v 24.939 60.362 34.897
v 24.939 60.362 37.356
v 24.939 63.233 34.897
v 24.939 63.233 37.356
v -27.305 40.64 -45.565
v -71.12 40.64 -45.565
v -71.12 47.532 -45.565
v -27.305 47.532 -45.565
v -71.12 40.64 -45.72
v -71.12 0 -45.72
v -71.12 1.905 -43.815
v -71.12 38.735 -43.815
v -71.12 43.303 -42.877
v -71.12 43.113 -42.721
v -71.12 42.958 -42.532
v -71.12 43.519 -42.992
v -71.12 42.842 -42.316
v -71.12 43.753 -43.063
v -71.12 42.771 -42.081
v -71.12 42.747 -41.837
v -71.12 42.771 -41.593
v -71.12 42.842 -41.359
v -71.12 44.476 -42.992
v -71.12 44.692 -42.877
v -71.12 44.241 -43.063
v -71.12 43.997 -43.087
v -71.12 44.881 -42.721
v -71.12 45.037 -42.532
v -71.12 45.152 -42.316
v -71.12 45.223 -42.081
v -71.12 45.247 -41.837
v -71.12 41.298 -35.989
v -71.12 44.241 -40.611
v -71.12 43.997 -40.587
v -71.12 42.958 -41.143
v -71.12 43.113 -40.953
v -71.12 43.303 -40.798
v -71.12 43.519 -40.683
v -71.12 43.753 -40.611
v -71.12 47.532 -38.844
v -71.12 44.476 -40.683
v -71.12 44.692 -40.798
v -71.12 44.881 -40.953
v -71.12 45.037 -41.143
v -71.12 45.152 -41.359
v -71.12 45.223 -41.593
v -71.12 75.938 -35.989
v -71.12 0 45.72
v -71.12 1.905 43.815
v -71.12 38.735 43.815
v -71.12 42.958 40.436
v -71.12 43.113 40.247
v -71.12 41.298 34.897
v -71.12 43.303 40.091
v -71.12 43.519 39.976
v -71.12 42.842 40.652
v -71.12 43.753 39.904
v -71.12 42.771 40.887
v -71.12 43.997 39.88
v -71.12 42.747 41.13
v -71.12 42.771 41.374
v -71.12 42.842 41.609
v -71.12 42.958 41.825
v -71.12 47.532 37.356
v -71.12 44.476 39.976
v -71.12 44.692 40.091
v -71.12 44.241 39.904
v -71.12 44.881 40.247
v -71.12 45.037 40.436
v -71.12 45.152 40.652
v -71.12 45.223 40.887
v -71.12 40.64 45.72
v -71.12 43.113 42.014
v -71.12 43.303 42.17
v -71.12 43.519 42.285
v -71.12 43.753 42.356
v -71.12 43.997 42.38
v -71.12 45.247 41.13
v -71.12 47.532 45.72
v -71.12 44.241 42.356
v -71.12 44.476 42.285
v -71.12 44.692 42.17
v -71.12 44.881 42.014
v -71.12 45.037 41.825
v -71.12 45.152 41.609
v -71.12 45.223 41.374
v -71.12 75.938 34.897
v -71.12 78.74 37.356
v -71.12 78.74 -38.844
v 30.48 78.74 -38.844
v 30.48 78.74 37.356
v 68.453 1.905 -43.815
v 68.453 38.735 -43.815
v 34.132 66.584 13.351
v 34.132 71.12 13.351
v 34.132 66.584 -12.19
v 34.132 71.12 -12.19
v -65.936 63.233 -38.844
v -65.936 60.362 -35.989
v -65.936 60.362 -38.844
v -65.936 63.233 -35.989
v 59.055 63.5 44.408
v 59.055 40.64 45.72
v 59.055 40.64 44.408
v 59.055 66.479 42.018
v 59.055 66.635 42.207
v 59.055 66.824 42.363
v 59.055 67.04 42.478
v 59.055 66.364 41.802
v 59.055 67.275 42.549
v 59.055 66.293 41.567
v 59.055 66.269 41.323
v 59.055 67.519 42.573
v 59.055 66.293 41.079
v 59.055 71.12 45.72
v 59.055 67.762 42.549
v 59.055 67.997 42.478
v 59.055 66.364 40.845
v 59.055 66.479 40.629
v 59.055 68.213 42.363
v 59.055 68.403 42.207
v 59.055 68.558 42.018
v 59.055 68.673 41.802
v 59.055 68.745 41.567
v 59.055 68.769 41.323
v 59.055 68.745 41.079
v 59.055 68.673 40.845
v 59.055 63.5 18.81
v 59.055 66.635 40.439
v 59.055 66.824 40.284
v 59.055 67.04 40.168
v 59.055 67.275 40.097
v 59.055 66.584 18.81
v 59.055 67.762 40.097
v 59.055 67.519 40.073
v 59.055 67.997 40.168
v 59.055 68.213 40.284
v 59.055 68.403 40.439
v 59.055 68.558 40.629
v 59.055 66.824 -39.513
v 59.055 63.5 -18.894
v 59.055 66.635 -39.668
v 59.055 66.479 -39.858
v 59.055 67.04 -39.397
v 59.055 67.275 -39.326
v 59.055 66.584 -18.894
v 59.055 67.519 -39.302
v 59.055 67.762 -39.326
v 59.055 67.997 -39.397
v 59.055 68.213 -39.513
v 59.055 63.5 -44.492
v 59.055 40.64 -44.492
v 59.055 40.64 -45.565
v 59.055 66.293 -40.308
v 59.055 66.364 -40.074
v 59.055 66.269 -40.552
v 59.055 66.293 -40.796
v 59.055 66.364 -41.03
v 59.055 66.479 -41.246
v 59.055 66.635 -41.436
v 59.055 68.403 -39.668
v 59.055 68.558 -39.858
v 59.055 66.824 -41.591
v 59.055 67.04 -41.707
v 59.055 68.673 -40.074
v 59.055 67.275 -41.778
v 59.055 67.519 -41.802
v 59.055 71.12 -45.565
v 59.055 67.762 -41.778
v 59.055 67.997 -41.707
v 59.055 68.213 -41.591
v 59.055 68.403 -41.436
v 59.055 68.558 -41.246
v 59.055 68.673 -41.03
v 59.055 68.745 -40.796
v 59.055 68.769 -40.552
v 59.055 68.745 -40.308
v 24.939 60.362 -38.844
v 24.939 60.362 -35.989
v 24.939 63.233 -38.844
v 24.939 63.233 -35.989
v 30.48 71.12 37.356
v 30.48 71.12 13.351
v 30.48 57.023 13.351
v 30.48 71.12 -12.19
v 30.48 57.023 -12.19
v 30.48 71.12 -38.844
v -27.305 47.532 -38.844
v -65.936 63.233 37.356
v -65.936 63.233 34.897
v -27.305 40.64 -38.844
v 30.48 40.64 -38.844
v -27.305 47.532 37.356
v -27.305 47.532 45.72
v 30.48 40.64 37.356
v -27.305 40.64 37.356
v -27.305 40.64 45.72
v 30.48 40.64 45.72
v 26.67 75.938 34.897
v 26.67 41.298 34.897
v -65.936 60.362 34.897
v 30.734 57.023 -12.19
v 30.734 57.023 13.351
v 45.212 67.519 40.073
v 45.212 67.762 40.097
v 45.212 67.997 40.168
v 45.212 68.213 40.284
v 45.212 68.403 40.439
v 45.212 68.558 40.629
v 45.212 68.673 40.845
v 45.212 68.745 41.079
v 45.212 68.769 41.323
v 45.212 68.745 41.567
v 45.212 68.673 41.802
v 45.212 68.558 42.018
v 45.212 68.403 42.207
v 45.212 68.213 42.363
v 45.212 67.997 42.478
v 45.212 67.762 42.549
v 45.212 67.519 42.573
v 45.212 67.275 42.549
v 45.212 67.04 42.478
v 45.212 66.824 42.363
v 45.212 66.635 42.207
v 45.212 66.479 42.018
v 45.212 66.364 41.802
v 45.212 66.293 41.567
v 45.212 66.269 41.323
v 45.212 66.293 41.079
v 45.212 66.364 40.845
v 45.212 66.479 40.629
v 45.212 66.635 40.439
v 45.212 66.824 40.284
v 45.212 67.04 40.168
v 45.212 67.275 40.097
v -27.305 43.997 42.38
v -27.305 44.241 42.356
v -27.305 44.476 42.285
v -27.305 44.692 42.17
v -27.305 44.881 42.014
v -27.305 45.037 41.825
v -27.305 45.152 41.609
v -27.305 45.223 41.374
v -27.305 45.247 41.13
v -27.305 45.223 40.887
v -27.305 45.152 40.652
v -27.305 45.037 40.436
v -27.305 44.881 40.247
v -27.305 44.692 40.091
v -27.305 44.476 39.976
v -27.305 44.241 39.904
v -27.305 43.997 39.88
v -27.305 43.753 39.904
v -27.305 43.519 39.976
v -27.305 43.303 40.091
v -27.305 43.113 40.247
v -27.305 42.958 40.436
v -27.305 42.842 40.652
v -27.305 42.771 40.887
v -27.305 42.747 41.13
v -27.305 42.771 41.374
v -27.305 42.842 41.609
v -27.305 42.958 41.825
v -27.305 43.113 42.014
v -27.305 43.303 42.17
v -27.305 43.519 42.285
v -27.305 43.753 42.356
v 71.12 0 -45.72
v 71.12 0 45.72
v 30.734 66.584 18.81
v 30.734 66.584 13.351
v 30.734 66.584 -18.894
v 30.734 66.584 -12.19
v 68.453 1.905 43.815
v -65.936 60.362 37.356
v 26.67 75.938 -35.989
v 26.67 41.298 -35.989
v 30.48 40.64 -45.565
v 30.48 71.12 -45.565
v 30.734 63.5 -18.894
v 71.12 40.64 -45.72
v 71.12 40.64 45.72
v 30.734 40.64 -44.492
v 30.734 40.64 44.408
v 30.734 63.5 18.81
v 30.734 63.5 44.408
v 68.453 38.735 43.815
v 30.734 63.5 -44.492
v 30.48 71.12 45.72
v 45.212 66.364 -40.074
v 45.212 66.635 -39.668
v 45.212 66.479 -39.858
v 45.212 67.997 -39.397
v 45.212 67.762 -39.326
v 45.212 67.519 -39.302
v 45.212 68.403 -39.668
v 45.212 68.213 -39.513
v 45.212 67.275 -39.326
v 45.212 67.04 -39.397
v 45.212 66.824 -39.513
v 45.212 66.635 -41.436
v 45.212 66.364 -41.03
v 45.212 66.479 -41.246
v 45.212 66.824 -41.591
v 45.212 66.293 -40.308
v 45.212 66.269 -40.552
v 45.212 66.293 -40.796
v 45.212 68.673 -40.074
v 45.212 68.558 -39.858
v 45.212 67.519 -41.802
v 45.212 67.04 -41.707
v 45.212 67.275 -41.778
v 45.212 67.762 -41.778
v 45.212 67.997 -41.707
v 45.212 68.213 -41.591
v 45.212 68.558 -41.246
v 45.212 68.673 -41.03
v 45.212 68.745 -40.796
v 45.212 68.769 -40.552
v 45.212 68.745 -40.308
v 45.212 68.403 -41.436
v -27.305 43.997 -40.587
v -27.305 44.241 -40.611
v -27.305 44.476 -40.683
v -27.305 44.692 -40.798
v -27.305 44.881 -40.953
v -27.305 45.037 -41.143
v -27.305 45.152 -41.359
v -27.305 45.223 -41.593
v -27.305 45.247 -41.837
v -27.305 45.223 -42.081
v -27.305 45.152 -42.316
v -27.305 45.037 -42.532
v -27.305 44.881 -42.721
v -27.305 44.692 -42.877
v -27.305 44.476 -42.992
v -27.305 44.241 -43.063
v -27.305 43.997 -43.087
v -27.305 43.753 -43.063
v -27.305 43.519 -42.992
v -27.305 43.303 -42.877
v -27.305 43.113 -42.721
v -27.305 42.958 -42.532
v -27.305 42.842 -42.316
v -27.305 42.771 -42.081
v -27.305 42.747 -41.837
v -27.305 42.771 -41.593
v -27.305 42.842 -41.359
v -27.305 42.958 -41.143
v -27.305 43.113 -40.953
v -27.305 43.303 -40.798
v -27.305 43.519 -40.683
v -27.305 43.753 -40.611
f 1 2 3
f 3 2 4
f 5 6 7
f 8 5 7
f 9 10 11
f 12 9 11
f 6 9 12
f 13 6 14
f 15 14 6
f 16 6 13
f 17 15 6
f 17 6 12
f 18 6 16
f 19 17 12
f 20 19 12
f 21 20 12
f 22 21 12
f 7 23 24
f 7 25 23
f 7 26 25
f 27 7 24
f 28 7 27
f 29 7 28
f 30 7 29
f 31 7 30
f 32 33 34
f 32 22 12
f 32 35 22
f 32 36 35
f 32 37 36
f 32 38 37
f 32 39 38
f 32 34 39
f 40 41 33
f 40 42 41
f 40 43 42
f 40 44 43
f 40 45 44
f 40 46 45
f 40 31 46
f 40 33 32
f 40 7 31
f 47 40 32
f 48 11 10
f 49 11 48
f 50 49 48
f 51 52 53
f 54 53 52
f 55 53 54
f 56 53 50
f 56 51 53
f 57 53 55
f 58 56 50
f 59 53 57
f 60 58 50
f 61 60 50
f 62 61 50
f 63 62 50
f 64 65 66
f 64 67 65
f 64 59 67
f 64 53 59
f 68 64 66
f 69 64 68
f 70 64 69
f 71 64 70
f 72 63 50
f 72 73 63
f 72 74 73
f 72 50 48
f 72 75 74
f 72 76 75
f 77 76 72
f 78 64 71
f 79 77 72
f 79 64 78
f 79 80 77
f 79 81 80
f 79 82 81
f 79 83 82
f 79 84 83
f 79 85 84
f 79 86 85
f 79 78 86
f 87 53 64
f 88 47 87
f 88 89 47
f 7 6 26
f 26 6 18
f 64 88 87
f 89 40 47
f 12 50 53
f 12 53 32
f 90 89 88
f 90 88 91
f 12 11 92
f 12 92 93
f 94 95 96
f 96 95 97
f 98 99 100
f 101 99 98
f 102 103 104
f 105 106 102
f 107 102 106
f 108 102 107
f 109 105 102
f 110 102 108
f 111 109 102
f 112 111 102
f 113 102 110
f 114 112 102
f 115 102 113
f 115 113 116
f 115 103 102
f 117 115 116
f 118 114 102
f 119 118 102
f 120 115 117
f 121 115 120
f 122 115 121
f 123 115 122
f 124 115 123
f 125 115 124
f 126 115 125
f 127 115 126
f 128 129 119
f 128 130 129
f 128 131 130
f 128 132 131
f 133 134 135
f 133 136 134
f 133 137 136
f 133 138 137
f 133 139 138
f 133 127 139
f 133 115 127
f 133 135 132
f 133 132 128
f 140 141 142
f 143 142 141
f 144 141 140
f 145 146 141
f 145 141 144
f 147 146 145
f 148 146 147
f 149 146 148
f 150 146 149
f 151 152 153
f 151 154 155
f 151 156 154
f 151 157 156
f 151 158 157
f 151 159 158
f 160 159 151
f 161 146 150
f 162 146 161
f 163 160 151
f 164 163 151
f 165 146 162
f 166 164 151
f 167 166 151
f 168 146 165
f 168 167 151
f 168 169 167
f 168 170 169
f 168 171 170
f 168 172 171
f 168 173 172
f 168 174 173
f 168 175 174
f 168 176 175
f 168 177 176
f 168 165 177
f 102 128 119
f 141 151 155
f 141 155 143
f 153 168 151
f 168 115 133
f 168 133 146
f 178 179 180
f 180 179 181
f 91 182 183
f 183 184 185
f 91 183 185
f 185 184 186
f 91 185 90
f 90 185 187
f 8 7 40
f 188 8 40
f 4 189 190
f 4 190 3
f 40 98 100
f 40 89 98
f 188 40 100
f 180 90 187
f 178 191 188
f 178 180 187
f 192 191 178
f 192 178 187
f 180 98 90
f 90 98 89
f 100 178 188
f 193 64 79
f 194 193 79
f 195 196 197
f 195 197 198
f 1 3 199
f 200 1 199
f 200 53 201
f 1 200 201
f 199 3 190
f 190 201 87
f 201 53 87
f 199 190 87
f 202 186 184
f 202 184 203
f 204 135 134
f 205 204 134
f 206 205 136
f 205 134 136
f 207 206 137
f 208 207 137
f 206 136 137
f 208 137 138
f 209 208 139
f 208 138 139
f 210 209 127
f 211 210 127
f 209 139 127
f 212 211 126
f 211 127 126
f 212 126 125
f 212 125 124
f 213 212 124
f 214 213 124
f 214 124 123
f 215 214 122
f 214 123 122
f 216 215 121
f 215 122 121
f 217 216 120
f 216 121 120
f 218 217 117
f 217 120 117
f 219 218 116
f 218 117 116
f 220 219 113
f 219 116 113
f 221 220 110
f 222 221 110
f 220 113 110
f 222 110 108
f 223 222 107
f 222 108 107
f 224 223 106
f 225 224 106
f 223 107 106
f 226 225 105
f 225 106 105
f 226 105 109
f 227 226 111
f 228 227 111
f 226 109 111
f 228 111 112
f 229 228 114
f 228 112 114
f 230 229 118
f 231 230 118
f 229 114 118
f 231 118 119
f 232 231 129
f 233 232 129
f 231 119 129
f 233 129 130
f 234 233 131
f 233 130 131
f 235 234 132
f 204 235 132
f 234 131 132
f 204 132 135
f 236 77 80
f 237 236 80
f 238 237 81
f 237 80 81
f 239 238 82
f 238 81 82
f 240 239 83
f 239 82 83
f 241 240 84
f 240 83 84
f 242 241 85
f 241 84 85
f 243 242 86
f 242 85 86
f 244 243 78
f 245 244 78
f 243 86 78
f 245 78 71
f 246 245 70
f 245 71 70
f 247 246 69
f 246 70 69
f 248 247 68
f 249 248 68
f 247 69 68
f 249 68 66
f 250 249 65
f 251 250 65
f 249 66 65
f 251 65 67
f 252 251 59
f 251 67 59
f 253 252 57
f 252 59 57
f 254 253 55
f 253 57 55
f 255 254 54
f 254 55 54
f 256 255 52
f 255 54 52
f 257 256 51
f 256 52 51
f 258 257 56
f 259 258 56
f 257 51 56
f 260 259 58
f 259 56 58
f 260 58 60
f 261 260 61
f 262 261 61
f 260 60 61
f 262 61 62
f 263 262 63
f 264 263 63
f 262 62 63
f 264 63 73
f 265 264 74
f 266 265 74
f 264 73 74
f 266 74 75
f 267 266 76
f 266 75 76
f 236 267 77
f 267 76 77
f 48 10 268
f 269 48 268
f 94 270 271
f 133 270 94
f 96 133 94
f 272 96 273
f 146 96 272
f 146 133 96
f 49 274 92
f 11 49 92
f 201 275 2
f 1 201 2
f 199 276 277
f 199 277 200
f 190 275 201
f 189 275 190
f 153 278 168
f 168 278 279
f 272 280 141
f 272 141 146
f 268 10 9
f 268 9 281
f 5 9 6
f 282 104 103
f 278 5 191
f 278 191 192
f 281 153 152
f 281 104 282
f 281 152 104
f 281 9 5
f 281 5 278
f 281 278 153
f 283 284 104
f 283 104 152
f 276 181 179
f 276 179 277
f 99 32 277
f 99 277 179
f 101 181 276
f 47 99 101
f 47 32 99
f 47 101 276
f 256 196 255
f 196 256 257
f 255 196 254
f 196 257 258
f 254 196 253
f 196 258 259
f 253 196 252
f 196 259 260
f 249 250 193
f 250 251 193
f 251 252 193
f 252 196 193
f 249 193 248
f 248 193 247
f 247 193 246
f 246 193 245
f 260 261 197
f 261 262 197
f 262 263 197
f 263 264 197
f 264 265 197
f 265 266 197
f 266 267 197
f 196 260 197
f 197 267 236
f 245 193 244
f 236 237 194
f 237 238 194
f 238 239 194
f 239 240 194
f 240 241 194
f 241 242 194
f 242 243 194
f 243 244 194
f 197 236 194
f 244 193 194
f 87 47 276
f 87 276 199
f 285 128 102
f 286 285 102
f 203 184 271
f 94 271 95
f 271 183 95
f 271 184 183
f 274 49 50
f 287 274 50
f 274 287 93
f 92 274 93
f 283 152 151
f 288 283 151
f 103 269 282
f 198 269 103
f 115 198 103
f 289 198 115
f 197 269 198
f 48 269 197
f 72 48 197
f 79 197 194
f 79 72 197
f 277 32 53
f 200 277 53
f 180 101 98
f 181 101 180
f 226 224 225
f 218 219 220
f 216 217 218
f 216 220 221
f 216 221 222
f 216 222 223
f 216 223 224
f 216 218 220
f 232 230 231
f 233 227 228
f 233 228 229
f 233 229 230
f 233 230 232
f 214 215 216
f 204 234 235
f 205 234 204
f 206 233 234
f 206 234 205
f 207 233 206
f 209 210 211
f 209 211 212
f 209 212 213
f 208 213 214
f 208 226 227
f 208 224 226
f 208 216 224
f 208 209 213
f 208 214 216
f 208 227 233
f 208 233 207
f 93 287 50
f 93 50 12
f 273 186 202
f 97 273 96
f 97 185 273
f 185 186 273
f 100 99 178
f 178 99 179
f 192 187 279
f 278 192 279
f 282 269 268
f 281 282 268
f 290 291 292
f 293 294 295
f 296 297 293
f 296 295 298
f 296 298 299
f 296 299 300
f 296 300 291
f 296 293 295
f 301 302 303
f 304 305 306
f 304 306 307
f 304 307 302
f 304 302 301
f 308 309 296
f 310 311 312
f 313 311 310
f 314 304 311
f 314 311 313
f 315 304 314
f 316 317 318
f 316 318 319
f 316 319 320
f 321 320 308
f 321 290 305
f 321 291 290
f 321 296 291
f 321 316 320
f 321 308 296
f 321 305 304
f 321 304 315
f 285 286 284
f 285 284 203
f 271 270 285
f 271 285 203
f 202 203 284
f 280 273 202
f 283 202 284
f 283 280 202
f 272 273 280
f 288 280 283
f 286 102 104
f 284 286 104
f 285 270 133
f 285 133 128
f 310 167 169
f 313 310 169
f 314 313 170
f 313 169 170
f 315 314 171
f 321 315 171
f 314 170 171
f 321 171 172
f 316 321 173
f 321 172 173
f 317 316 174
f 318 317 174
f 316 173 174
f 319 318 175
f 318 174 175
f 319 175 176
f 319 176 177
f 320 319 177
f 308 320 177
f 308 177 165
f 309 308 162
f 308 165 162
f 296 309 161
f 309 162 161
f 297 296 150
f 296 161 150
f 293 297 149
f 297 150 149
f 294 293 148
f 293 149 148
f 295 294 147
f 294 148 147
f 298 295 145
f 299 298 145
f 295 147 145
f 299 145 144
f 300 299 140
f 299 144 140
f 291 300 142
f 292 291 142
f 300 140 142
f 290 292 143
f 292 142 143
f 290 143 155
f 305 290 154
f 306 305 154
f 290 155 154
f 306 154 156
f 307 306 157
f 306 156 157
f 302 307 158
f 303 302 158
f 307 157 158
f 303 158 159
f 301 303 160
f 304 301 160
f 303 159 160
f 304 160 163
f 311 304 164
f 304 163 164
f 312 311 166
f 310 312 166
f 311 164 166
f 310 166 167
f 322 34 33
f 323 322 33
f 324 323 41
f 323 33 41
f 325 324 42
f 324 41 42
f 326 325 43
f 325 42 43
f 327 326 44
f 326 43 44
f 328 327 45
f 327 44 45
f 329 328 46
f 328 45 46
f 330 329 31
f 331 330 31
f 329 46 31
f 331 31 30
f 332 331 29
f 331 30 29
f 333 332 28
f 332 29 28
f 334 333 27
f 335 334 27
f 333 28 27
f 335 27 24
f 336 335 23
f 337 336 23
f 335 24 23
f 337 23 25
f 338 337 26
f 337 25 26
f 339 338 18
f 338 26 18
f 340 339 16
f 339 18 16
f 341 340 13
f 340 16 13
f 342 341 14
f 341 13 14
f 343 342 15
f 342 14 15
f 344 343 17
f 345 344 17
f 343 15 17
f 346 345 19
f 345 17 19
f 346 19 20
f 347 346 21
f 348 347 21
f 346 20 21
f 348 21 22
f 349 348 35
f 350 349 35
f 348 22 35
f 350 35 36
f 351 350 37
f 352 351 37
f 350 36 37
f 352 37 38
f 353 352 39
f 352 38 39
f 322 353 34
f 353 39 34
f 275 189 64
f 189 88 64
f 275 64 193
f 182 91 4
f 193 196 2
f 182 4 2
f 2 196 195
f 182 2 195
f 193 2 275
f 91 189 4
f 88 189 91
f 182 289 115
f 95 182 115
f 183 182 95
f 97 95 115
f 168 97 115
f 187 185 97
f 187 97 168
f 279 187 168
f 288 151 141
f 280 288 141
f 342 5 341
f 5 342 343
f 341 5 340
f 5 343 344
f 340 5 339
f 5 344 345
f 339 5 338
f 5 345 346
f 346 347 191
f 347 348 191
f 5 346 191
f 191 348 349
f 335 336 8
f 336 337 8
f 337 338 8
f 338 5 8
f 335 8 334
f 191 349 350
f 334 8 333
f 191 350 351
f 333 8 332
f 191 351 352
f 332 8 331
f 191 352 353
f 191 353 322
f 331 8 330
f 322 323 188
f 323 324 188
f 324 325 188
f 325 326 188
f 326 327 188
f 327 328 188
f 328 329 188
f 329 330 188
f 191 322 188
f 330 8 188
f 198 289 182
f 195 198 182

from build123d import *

# Parameters (mm, degrees)
SKETCH1_W           = 142.24
SKETCH1_H           = 91.44
BOSS_EXTRUDE1_DEPTH = 40.64
SKETCH3_W           = 101.6
SKETCH3_H           = 76.2
BOSS_EXTRUDE2_DEPTH = 38.1
SKETCH4_W           = 70.885711102
SKETCH4_H           = 34.639527003
CUT_EXTRUDE2_DEPTH  = 97.79
SKETCH5_W           = 90.875163882
SKETCH5_H           = 2.870686322
CUT_EXTRUDE3_DEPTH  = 97.79
SKETCH8_W           = 91.28479526
SKETCH8_H           = 30.48
BOSS_EXTRUDE4_DEPTH = 28.575
SKETCH9_W           = 37.704579212
SKETCH9_H           = 3.084273822
CUT_EXTRUDE4_DEPTH  = 28.321
SKETCH10_W          = 3.65161605
SKETCH10_H          = 25.540665071
CUT_EXTRUDE5_DEPTH  = 14.097
SKETCH2_W           = 87.63
SKETCH2_H           = 36.83
CUT_EXTRUDE6_DEPTH  = 225.933
SKETCH12_W          = 91.44
SKETCH12_H          = 40.64
BOSS_EXTRUDE5_DEPTH = 2.667
SKETCH13_W          = 6.720820965
SKETCH13_H          = 6.891818051
SKETCH13_R          = 1.25
SKETCH13_W_2        = 8.363974295
BOSS_EXTRUDE6_DEPTH = 43.815
SKETCH14_R          = 1.25
CUT_EXTRUDE7_DEPTH  = 13.843


with BuildPart() as part:
    # Sketch1 → Boss-Extrude1 (new body)
    with BuildSketch(Plane(origin=(0, 0, 0), x_dir=(1, 0, 0), z_dir=(0, 1, 0))):
        Rectangle(SKETCH1_W, SKETCH1_H)
    extrude(amount=BOSS_EXTRUDE1_DEPTH)

    # Sketch3 → Boss-Extrude2 (add)
    with BuildSketch(Plane(origin=(0, 40.64, 0), x_dir=(1, 0, 0), z_dir=(0, 1, 0))):
        with Locations((-20.32, 0.743974295)):
            Rectangle(SKETCH3_W, SKETCH3_H)
    extrude(amount=BOSS_EXTRUDE2_DEPTH)

    # Sketch4 → Cut-Extrude2 (cut)
    with BuildSketch(Plane.ZY.offset(71.12)):
        with Locations((-0.546263413, 58.617752018)):
            Rectangle(SKETCH4_W, SKETCH4_H)
    extrude(amount=-CUT_EXTRUDE2_DEPTH, mode=Mode.SUBTRACT)

    # Sketch5 → Cut-Extrude3 (cut)
    with BuildSketch(Plane.XY.offset(37.356025705)):
        with Locations((-20.498494518, 61.797236891)):
            Rectangle(SKETCH5_W, SKETCH5_H)
    extrude(amount=-CUT_EXTRUDE3_DEPTH, mode=Mode.SUBTRACT)

    # Sketch8 → Boss-Extrude4 (add)
    with BuildSketch(Plane(origin=(30.48, 0, 0), x_dir=(0, 0, -1), z_dir=(1, 0, 0))):
        with Locations((-0.07760237, 55.88)):
            Rectangle(SKETCH8_W, SKETCH8_H)
    extrude(amount=BOSS_EXTRUDE4_DEPTH)

    # Sketch9 → Cut-Extrude4 (cut)
    with BuildSketch(Plane(origin=(59.055, 0, 0), x_dir=(0, 0, -1), z_dir=(1, 0, 0))):
        with Locations((0.04199785, 65.042136911)):
            Rectangle(SKETCH9_W, SKETCH9_H)
        with Locations((0.04199785, 61.957863089)):
            Rectangle(SKETCH9_W, SKETCH9_H)
        Polygon((-18.810291756, 63.5), (-44.40800215, 63.5), (-44.40800215, 40.64), (44.49199785, 40.64), (44.49199785, 63.5), (18.894287456, 63.5), (18.894287456, 60.415726178), (-18.810291756, 60.415726178), align=None)
    extrude(amount=-CUT_EXTRUDE4_DEPTH, mode=Mode.SUBTRACT)

    # Sketch10 → Cut-Extrude5 (cut)
    with BuildSketch(Plane(origin=(0, 71.12, 0), x_dir=(1, 0, 0), z_dir=(0, 1, 0))):
        with Locations((32.305808025, -0.58046966)):
            Rectangle(SKETCH10_W, SKETCH10_H)
    extrude(amount=-CUT_EXTRUDE5_DEPTH, mode=Mode.SUBTRACT)

    # Sketch2 → Cut-Extrude6 (cut)
    with BuildSketch(Plane(origin=(71.12, 0, 0), x_dir=(0, 0, -1), z_dir=(1, 0, 0))):
        with Locations((0, 20.32)):
            Rectangle(SKETCH2_W, SKETCH2_H)
    extrude(amount=-CUT_EXTRUDE6_DEPTH, mode=Mode.SUBTRACT)

    # Sketch12 → Boss-Extrude5 (add)
    with BuildSketch(Plane(origin=(71.12, 0, 0), x_dir=(0, 0, -1), z_dir=(1, 0, 0))):
        with Locations((0, 20.32)):
            Rectangle(SKETCH12_W, SKETCH12_H)
    extrude(amount=-BOSS_EXTRUDE5_DEPTH)

    # Sketch13 → Boss-Extrude6 (add)
    # profile 1 of 2: a face of its own
    with BuildSketch(Plane.ZY.offset(71.12)):
        with Locations((-42.204384778, 44.085909026)):
            Rectangle(SKETCH13_W, SKETCH13_H)
        with Locations((-41.837350795, 43.997172438)):
            Circle(SKETCH13_R, mode=Mode.SUBTRACT)
    # profile 2 of 2: a face of its own
    with BuildSketch(Plane.ZY.offset(71.12)):
        with Locations((41.538012853, 44.085909026)):
            Rectangle(SKETCH13_W_2, SKETCH13_H)
        with Locations((41.130421673, 43.997172438)):
            Circle(SKETCH13_R, mode=Mode.SUBTRACT)
    extrude(amount=-BOSS_EXTRUDE6_DEPTH)

    # Sketch14 → Cut-Extrude7 (cut)
    with BuildSketch(Plane(origin=(59.055, 0, 0), x_dir=(0, 0, -1), z_dir=(1, 0, 0))):
        with Locations((-41.323220525, 67.518632332)):
            Circle(SKETCH14_R)
        with Locations((40.552025118, 67.518632332)):
            Circle(SKETCH14_R)
    extrude(amount=-CUT_EXTRUDE7_DEPTH, mode=Mode.SUBTRACT)


solid = part.part
